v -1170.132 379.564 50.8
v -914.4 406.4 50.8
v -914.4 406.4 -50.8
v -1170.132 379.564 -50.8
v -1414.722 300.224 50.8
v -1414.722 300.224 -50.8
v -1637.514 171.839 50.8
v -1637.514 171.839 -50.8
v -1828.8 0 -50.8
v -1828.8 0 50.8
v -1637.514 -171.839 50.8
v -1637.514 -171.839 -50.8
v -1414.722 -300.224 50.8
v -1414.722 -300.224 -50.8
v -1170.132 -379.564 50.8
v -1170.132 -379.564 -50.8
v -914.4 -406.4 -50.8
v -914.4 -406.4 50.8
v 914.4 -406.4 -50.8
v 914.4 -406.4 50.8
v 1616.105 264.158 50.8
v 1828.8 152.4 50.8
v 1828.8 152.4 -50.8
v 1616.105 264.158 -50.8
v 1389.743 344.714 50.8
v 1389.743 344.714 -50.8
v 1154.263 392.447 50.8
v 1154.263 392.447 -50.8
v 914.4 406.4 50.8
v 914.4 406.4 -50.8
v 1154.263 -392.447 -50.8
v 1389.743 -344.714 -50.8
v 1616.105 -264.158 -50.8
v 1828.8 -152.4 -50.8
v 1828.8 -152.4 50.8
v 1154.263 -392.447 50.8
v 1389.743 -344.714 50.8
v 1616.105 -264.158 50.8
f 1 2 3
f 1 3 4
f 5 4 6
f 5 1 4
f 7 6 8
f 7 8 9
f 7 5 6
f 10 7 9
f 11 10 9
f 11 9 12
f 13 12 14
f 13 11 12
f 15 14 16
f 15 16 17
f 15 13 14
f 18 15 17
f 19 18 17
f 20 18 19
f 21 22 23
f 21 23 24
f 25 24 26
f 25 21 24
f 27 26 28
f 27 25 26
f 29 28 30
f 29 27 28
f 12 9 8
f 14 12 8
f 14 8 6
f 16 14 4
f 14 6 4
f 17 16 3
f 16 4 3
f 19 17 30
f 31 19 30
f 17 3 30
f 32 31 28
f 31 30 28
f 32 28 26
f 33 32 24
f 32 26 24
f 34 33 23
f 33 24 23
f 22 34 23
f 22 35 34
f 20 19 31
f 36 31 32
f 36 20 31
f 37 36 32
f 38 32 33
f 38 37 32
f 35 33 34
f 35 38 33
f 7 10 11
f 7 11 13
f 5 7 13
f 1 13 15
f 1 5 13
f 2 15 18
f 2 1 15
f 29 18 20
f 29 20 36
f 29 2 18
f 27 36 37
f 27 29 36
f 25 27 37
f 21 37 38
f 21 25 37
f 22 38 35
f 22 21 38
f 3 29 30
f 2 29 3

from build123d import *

# Parameters (mm, degrees)
F1_DEPTH      = 50.8
F1_DEPTH_BACK = 50.8


# Not quite as in the source:
# - the program builds the solid bodies; features that only make, move or delete a surface that nothing else refers to are left out


with BuildPart() as f1:
    # F0 (on Top) → F1 (new body, two sides)
    with BuildSketch(Plane.XY) as f1_sk:
        with BuildLine():
            Line((1828.8, -152.4), (1828.8, 152.4))
            ThreePointArc((1828.8, 152.4), (1389.7426827553, 344.713657919), (914.4, 406.4))
            Line((914.4, 406.4), (0, 406.4))
            Line((0, 406.4), (-914.4, 406.4))
            ThreePointArc((-914.4, 406.4), (-1414.7219763312, 300.2244467453), (-1828.8, 0))
            ThreePointArc((-1828.8, 0), (-1414.7219763312, -300.2244467453), (-914.4, -406.4))
            Line((-914.4, -406.4), (0, -406.4))
            Line((0, -406.4), (914.4, -406.4))
            ThreePointArc((914.4, -406.4), (1389.7426827553, -344.713657919), (1828.8, -152.4))
        make_face()
    extrude(amount=F1_DEPTH)
    extrude(f1_sk.sketch, amount=-F1_DEPTH_BACK)


solid = f1.part
